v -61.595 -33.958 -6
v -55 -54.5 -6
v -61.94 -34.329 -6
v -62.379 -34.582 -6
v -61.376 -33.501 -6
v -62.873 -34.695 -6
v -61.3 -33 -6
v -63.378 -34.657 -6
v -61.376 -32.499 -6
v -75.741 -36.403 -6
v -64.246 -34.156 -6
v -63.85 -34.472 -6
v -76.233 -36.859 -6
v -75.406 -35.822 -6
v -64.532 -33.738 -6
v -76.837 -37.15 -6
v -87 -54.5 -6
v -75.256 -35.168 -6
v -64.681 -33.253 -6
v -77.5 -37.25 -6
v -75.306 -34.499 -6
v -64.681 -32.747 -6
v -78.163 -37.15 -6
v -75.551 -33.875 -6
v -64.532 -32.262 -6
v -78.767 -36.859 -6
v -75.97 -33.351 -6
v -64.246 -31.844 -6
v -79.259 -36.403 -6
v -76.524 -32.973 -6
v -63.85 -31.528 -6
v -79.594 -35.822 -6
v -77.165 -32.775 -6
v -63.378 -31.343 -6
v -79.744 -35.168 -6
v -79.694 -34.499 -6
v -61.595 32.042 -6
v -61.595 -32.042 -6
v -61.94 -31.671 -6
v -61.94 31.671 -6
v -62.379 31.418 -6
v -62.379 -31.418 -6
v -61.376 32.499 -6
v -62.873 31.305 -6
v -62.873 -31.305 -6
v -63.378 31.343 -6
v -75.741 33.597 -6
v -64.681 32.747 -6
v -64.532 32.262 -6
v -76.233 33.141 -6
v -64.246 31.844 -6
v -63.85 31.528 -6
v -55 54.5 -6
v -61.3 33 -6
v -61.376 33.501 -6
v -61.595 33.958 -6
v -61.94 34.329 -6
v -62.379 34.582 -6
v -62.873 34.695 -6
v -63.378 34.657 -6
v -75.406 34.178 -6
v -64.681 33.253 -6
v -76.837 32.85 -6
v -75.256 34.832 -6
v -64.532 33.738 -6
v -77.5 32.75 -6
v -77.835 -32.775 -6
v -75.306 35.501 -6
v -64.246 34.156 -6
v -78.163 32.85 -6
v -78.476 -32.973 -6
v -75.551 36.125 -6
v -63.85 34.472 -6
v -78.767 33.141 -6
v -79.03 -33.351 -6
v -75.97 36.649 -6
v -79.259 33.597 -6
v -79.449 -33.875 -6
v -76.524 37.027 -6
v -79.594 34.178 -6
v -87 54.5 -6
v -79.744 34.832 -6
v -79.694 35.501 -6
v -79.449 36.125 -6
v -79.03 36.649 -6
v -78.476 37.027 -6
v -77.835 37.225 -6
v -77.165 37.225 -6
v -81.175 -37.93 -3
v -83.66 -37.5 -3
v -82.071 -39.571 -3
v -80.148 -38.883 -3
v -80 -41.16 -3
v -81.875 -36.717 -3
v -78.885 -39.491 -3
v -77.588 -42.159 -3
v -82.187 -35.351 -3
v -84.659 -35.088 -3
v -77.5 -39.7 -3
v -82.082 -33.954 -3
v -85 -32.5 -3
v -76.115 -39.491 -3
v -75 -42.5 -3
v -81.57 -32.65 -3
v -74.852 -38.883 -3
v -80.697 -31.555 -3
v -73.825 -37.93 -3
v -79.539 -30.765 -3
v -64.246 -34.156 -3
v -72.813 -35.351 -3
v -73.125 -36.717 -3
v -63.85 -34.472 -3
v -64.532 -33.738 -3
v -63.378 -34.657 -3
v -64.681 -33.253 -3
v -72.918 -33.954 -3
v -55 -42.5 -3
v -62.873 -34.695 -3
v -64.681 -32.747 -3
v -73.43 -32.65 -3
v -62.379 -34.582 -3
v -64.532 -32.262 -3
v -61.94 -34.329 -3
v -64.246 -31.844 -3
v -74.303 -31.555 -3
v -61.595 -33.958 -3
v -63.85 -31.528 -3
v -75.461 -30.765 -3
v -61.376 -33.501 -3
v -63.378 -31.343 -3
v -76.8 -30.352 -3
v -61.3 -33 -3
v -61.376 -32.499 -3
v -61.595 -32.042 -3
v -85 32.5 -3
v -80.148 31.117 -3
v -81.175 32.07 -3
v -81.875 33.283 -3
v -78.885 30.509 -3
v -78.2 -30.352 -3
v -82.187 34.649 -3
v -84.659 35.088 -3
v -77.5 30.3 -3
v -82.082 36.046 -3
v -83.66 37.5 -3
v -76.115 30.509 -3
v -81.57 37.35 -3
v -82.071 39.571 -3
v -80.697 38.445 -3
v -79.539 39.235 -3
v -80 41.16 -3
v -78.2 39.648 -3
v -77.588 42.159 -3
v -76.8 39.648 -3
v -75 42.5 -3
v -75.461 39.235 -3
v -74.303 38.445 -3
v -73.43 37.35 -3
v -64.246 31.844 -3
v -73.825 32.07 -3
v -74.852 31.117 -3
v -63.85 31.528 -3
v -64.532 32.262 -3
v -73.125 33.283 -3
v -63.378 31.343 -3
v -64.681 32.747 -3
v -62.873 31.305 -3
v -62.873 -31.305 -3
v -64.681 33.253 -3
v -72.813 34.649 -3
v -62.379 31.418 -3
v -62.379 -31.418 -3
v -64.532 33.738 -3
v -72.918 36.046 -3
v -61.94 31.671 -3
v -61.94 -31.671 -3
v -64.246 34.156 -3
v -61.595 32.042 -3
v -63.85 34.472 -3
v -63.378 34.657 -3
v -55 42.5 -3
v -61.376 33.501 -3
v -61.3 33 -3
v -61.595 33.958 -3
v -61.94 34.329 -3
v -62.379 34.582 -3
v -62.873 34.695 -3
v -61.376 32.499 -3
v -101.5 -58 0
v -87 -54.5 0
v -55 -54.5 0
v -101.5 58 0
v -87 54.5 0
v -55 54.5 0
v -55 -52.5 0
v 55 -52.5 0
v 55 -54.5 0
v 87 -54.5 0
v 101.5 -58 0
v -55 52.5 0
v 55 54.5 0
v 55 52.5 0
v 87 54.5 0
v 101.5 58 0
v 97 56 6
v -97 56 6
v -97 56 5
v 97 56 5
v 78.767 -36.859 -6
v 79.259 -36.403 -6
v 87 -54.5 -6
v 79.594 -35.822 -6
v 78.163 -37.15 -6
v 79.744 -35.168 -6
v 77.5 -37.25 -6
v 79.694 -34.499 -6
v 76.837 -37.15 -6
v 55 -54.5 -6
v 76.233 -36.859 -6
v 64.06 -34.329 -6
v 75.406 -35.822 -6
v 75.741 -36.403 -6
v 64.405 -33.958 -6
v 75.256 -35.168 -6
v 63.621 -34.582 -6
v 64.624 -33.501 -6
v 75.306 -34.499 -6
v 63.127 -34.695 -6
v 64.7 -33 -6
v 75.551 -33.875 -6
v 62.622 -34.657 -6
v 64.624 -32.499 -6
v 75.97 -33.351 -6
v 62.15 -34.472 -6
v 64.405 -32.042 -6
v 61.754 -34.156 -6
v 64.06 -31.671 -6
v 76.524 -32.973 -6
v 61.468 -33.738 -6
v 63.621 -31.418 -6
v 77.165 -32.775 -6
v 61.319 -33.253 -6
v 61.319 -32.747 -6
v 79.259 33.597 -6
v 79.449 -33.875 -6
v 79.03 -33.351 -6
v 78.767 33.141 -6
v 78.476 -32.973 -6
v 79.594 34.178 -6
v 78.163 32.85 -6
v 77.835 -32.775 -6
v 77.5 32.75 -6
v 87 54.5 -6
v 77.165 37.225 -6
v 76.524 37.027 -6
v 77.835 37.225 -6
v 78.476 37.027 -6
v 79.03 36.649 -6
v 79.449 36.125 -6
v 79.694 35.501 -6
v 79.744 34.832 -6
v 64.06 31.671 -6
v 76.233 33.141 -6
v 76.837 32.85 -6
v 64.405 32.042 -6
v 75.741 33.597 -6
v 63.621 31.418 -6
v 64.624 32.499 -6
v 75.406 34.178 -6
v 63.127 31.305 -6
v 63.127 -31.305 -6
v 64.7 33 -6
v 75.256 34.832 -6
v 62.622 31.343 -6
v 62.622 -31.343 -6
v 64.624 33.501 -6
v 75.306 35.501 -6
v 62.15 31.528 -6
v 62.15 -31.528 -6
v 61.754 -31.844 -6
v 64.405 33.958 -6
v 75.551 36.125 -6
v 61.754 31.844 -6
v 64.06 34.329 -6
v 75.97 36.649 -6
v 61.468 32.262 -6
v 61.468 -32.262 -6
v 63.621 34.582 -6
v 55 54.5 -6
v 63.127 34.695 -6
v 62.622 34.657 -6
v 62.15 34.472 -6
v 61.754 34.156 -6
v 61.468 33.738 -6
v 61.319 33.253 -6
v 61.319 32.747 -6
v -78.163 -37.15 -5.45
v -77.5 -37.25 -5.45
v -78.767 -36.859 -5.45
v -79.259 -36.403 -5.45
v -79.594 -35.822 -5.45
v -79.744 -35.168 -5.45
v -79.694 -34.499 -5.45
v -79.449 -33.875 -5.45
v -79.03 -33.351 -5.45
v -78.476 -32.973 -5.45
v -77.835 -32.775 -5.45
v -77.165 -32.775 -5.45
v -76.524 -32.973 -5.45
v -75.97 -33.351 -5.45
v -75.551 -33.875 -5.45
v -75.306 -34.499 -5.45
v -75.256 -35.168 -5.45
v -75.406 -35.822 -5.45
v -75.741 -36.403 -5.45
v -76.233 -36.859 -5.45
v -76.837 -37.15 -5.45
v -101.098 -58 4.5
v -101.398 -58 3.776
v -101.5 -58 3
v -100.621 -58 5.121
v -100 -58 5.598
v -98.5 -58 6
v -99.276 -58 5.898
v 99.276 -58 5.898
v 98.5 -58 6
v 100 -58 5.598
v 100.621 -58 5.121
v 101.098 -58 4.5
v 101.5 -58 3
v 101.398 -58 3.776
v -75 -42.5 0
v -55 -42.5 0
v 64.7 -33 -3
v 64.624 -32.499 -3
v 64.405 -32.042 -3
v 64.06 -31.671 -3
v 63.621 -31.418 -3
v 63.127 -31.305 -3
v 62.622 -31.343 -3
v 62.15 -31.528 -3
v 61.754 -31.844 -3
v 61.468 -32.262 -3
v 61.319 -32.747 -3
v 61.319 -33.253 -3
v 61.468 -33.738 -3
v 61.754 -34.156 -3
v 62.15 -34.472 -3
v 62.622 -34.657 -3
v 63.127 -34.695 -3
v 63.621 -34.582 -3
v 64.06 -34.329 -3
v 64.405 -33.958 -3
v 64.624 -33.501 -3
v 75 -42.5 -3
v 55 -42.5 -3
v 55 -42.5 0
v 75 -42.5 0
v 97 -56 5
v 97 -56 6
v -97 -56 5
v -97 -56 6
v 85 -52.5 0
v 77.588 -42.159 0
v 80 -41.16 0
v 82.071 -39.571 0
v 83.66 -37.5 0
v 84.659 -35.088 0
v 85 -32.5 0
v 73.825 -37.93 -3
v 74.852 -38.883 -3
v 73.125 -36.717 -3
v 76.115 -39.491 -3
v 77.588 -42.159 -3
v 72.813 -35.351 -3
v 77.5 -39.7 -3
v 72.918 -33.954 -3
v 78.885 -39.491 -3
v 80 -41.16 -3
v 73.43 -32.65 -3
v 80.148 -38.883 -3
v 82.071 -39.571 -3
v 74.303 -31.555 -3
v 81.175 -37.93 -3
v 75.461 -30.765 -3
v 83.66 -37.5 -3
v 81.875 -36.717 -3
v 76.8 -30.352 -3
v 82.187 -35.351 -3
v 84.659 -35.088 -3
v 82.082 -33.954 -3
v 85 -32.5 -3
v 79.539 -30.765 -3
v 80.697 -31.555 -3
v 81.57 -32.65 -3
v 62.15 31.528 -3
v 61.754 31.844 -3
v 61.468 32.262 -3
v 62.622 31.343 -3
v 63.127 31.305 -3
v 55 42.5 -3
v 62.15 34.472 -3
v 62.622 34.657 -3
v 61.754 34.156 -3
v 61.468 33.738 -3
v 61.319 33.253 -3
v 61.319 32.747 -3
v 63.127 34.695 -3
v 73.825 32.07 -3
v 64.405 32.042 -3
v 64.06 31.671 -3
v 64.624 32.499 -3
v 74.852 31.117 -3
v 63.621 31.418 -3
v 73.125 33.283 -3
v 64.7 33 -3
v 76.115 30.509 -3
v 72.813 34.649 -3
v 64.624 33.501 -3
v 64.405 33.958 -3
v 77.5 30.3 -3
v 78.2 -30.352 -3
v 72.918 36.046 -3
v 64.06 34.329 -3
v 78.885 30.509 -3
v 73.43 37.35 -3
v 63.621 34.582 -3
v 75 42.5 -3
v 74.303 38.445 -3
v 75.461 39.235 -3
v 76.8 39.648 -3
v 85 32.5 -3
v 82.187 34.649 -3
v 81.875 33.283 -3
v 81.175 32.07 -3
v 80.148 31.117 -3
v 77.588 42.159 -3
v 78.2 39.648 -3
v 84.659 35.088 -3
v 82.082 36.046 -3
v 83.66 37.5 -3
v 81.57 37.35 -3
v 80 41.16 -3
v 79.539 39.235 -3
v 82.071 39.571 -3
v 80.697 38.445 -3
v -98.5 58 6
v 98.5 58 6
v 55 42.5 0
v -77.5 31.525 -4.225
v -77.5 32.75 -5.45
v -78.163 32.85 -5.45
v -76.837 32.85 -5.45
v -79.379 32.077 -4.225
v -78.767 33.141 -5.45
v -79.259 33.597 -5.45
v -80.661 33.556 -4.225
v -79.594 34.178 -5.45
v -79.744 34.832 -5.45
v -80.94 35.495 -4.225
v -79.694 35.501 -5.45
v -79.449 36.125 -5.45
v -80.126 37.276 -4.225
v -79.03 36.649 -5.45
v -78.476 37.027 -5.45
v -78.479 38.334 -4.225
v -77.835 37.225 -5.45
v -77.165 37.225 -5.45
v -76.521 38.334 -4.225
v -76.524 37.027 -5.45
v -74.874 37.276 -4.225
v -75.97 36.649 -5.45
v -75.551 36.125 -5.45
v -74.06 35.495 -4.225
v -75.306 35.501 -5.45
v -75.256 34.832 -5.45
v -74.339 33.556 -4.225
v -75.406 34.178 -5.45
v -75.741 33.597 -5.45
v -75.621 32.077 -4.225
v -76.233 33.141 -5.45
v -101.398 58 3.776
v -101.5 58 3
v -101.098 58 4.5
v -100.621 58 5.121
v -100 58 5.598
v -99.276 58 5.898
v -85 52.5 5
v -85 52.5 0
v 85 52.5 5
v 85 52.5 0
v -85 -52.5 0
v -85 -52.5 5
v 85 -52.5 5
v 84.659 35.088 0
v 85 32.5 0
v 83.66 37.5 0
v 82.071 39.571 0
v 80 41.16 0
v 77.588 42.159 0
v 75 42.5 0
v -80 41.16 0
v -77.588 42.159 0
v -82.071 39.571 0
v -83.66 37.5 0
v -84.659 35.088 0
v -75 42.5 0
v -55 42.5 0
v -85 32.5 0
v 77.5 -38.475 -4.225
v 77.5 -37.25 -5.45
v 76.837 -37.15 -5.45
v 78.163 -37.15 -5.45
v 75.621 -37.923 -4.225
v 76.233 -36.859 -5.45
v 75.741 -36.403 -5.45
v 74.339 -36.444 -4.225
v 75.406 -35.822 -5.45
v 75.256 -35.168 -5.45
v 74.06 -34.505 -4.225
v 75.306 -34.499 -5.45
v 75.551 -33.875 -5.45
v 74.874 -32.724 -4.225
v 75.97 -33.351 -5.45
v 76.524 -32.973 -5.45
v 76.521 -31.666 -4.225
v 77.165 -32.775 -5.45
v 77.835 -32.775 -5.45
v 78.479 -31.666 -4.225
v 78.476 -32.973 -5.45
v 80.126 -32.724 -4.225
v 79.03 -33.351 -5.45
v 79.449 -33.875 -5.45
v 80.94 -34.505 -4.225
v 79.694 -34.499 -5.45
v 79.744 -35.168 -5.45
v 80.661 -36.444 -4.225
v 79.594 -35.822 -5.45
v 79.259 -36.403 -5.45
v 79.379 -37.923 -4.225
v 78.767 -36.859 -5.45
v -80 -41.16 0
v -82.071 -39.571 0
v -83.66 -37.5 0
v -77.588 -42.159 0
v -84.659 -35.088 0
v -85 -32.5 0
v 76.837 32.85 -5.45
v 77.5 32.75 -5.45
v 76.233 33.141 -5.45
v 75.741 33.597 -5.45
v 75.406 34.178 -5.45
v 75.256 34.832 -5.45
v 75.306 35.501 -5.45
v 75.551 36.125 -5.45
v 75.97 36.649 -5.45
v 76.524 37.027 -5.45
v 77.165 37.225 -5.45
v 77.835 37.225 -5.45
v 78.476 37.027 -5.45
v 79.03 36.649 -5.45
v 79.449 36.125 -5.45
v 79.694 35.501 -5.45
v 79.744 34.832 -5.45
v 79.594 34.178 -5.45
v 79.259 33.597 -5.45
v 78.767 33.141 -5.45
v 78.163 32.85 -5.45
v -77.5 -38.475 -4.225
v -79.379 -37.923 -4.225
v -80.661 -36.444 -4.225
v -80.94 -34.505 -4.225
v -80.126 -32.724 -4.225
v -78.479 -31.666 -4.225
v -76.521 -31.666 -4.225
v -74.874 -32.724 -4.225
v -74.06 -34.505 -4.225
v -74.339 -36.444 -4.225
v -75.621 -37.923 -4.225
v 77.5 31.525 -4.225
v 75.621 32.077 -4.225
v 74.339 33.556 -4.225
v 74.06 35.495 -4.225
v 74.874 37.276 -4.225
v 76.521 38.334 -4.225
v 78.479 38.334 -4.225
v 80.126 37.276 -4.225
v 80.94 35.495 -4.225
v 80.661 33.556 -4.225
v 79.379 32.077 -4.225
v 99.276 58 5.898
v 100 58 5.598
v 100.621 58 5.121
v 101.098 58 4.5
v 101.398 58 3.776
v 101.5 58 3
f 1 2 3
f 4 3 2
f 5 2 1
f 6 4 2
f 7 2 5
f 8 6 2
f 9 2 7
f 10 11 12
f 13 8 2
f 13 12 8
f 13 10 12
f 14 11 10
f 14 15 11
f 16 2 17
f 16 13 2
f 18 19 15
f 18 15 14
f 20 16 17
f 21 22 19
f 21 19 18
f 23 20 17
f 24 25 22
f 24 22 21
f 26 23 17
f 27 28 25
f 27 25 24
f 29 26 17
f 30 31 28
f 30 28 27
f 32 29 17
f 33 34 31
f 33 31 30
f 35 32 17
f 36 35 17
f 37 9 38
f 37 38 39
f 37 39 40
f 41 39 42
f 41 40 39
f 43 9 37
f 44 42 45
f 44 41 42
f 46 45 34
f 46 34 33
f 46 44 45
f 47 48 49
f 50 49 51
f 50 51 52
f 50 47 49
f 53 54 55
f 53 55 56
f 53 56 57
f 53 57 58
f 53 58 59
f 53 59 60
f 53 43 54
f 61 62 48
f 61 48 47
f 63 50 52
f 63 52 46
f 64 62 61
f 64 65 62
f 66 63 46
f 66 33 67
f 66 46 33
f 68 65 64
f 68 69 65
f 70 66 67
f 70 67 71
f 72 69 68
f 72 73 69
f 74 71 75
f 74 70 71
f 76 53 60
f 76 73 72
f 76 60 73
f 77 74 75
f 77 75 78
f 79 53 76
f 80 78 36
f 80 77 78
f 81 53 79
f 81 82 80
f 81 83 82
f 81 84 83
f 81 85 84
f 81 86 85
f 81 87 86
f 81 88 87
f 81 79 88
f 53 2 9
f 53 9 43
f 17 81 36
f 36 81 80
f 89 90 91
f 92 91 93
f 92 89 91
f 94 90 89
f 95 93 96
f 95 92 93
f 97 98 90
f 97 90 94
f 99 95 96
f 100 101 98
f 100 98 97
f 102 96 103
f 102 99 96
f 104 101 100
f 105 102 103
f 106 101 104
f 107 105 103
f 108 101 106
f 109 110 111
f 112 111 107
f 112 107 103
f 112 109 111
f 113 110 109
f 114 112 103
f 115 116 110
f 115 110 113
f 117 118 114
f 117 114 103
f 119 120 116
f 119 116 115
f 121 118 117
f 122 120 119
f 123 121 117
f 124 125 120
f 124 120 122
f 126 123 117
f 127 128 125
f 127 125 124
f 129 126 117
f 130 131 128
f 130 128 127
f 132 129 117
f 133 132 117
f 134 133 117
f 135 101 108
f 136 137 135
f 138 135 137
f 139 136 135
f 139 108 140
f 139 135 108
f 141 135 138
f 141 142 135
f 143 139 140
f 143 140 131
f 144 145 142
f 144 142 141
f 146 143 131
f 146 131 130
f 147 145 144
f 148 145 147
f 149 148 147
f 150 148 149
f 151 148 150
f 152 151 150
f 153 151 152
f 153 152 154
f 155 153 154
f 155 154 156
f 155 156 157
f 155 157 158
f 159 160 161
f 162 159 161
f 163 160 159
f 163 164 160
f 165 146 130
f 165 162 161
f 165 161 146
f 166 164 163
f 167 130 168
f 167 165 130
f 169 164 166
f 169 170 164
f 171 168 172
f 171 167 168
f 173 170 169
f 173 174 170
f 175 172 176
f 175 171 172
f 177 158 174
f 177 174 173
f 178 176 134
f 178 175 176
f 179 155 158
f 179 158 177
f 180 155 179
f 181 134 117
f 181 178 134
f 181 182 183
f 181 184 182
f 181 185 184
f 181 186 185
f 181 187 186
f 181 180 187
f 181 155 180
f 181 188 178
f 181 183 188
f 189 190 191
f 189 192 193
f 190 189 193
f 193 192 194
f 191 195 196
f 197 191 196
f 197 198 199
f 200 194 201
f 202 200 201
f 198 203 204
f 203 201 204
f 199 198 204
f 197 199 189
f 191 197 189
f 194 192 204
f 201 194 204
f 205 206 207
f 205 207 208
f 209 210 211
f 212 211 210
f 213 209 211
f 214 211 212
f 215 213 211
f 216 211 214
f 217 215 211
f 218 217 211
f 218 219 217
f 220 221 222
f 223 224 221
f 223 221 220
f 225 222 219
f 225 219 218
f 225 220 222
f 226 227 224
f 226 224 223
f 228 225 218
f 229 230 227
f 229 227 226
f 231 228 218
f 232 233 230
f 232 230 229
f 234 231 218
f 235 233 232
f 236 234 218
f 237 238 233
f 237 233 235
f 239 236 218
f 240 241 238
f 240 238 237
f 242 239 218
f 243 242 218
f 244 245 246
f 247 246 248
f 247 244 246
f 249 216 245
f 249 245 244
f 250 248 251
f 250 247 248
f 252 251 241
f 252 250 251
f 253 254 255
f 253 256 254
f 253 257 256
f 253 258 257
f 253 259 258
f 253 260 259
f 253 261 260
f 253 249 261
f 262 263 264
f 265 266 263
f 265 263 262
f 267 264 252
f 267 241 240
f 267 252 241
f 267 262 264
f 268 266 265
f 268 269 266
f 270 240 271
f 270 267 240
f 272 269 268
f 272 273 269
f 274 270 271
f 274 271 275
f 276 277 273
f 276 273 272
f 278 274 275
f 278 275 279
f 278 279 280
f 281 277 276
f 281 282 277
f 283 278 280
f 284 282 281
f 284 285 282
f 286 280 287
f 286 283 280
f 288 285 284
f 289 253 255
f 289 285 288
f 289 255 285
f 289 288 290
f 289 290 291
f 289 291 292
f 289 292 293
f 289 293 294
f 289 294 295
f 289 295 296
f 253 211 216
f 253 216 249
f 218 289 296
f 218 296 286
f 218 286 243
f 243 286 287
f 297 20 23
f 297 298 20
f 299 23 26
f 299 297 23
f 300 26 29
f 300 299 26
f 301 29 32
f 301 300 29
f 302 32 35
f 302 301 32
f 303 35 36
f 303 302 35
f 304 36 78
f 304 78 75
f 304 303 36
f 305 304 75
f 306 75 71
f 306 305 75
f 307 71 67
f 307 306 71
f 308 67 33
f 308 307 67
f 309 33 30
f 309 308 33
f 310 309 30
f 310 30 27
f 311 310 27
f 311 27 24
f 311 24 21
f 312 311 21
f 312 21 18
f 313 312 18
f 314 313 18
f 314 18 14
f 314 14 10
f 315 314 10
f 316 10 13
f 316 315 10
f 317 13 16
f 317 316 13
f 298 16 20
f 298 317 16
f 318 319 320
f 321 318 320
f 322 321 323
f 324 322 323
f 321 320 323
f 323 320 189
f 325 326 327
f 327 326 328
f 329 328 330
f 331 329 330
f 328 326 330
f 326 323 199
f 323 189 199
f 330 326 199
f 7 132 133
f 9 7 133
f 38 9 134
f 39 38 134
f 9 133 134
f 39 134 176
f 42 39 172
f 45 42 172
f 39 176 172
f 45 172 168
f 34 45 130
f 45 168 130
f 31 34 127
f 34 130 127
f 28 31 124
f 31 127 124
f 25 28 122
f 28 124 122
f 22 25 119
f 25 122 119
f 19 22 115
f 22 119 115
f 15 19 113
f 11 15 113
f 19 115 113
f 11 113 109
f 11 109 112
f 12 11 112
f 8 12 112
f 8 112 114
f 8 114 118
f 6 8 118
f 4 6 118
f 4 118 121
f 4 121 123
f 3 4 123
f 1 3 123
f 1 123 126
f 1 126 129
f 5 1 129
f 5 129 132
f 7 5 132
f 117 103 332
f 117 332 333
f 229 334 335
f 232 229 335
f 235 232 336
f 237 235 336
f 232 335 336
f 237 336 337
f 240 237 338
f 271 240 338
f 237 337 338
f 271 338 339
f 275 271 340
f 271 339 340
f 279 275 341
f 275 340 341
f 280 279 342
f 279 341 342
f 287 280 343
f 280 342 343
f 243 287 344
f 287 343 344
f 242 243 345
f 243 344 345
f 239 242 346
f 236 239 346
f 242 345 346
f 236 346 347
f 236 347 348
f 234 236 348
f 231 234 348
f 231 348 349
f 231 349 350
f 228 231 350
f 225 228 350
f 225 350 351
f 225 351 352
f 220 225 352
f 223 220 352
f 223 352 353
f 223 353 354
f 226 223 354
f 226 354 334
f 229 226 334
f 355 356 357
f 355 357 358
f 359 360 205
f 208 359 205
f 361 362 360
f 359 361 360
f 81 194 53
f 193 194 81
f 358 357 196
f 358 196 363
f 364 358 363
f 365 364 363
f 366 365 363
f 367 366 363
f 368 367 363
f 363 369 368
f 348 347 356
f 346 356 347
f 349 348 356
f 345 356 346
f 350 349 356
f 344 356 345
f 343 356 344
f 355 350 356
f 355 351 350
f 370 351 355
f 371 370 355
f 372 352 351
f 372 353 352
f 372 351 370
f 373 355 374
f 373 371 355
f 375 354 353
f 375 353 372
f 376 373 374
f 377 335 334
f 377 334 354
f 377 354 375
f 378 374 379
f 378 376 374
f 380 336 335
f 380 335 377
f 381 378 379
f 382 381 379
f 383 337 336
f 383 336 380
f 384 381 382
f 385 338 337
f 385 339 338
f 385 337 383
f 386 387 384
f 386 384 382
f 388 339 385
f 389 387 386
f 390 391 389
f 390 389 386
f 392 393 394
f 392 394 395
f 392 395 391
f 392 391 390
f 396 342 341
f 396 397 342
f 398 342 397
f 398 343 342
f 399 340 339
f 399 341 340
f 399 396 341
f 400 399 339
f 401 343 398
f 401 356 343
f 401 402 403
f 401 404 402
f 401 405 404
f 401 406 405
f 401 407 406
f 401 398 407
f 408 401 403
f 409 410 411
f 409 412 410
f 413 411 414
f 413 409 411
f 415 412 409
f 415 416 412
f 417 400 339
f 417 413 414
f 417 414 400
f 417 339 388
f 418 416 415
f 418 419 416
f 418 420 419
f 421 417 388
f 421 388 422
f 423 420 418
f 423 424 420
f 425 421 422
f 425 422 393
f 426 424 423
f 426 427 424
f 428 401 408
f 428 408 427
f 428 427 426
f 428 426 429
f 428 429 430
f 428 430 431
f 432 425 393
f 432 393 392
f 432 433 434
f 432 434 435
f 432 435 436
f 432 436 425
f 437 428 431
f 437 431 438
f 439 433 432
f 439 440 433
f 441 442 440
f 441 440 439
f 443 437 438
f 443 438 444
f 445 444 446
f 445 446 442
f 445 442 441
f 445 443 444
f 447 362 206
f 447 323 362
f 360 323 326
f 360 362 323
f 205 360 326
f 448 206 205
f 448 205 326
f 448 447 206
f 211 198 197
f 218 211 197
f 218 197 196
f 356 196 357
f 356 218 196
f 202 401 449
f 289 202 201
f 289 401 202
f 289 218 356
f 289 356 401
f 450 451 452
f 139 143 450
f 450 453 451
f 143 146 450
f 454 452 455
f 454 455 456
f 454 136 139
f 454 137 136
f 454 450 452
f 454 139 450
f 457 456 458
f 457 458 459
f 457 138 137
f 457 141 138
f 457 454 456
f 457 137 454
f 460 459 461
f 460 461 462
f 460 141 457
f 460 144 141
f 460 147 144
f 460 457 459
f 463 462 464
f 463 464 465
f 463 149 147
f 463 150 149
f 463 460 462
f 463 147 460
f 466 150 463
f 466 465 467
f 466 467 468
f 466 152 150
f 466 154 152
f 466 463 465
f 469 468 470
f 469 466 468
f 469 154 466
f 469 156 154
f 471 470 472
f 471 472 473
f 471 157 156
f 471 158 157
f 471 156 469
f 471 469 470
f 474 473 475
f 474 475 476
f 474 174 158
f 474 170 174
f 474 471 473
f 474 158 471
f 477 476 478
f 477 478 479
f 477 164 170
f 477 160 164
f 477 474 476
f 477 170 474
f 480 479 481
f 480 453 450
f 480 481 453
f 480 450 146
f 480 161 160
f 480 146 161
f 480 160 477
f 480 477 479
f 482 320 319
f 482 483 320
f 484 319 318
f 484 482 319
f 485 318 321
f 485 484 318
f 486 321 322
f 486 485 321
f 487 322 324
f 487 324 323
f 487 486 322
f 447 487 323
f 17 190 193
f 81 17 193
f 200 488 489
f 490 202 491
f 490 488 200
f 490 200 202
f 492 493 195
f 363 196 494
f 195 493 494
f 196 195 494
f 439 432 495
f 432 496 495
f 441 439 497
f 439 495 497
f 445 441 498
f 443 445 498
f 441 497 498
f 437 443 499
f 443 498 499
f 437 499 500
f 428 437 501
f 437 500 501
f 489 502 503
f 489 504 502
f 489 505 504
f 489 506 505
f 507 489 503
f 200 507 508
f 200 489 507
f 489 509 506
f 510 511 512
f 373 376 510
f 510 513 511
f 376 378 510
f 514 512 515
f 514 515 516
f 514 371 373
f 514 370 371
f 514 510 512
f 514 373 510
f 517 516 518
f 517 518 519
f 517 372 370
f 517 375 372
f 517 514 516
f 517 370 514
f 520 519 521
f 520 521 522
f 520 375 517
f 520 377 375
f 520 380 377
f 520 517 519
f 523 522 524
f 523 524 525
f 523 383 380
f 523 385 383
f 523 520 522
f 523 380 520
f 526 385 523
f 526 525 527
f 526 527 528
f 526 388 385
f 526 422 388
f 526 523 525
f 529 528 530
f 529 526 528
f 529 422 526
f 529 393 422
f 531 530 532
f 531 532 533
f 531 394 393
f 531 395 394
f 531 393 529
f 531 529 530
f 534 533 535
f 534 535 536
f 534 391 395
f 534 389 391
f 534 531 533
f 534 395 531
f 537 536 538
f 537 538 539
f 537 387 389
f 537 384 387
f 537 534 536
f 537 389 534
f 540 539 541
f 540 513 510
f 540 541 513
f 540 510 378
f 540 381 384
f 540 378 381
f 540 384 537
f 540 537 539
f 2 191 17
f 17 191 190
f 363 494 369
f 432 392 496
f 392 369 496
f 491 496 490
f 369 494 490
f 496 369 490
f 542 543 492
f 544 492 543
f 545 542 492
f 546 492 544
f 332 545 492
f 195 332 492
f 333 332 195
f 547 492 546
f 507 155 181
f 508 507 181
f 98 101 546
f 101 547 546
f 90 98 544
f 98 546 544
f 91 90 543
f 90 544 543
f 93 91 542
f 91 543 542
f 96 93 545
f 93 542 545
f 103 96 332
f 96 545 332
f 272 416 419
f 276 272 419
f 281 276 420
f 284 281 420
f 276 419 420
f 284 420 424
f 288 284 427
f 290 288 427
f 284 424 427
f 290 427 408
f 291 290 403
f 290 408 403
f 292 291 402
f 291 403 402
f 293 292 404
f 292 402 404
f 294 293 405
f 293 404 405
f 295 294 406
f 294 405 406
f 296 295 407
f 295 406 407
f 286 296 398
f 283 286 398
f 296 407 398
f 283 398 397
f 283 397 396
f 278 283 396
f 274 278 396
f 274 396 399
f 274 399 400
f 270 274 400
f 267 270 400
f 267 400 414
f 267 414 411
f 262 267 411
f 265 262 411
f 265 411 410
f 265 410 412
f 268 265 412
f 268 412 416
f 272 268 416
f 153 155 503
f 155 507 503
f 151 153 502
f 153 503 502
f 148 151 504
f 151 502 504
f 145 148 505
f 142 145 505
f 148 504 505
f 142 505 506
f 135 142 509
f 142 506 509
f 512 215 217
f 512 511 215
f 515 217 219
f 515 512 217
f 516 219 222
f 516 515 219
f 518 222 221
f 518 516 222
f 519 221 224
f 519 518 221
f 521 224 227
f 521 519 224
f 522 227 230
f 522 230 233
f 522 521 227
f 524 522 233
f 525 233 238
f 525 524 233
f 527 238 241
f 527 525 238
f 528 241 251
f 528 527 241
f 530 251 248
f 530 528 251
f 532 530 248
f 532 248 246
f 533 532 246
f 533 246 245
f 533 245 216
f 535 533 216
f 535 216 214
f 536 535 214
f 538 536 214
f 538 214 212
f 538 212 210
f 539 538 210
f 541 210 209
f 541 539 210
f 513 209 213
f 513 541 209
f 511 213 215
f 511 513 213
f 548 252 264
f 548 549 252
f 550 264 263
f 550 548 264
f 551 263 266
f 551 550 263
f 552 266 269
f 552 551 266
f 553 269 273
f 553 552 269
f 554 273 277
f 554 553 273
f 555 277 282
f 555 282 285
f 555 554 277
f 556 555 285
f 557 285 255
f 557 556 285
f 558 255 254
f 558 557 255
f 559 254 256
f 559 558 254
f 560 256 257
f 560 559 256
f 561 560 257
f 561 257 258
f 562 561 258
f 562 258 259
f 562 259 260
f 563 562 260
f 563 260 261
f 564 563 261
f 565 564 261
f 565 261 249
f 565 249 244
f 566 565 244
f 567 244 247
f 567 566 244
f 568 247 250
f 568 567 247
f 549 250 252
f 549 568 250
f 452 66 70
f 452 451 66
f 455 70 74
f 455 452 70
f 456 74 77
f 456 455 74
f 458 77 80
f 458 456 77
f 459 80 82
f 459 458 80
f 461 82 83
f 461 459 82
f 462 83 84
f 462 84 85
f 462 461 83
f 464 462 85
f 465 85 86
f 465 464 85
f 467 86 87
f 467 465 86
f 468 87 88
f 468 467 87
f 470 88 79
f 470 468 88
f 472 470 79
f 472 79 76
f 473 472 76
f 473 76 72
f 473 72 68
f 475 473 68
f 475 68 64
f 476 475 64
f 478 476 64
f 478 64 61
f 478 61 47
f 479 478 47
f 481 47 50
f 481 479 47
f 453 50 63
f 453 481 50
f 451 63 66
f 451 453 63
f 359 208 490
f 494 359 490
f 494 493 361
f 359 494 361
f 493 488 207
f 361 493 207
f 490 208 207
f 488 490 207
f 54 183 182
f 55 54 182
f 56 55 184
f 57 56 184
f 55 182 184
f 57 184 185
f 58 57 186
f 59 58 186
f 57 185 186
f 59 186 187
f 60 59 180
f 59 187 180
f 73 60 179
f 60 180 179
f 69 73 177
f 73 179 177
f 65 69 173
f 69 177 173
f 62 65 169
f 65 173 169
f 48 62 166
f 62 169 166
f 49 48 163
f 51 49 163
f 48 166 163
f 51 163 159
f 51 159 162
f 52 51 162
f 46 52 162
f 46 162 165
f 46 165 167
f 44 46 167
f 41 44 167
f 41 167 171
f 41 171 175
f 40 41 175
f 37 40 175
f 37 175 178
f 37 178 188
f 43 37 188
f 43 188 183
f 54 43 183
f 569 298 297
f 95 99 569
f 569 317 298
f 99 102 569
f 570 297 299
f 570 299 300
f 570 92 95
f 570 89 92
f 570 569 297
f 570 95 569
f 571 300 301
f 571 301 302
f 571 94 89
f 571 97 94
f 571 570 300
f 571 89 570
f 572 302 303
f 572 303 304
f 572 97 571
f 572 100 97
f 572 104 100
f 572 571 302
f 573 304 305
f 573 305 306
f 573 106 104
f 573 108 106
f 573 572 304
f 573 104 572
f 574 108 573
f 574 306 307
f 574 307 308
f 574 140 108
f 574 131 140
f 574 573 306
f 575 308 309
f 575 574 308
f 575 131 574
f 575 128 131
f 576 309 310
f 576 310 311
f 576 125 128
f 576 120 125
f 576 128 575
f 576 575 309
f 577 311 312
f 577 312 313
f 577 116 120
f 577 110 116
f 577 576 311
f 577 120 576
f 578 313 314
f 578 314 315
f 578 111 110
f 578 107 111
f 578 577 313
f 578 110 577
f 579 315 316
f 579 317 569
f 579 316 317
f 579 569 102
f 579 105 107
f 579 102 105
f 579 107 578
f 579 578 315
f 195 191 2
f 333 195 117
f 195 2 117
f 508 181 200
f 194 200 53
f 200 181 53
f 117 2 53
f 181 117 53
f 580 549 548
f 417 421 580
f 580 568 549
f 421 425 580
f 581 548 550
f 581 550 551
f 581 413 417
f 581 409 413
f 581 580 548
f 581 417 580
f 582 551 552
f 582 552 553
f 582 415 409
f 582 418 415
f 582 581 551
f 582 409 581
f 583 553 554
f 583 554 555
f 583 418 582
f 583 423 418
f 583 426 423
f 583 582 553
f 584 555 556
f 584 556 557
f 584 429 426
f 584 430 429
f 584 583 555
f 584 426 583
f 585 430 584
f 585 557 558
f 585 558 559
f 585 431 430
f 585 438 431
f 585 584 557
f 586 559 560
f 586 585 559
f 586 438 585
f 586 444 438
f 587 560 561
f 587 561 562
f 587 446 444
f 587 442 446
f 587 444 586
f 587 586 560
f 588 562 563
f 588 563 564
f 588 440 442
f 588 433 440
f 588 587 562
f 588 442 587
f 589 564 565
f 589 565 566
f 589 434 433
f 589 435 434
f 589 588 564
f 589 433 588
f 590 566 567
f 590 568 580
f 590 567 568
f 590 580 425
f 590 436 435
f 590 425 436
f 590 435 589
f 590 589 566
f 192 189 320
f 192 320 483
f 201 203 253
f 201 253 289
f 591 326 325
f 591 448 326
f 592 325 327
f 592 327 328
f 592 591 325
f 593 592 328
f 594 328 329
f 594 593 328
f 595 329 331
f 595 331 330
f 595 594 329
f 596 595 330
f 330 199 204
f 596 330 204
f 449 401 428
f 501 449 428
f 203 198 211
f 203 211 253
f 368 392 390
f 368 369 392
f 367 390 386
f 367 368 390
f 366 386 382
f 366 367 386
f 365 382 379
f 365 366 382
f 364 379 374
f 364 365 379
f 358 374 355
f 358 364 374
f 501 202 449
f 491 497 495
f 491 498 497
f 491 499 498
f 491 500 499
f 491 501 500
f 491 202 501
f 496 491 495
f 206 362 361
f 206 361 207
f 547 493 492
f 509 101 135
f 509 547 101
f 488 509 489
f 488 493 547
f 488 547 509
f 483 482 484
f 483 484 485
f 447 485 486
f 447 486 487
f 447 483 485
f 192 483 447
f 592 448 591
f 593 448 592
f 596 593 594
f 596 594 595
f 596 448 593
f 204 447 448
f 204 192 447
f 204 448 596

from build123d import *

# Parameters (mm, degrees)
ESBO_O1_W                                    = 203
ESBO_O1_H                                    = 116
RESSALTO_EXTRUS_O1_DEPTH                     = 6
ESBO_O2_W                                    = 194
ESBO_O2_H                                    = 112
CORTE_EXTRUS_O1_DEPTH                        = 1
FILETE2_R                                    = 3
ESBO_O3_W                                    = 174
ESBO_O3_H                                    = 109
RESSALTO_EXTRUS_O2_DEPTH                     = 11
ESBO_O4_W                                    = 110
ESBO_O4_H                                    = 109
CORTE_EXTRUS_O2_DEPTH                        = 6
ESBO_O5_W                                    = 170
ESBO_O5_H                                    = 105
CORTE_EXTRUS_O3_DEPTH                        = 8
FURO_COM_FOLGA_DE_M31_D                      = 3.4
ESCAREADO_PARA_PARAFUSO_COM_CABE_A_E_2_COUNT = 2
ESCAREADO_PARA_PARAFUSO_COM_CABE_A_E_2_PITCH = 155
ESCAREADO_PARA_PARAFUSO_COM_CABE_A_E_3_COUNT = 2
ESCAREADO_PARA_PARAFUSO_COM_CABE_A_E_3_PITCH = 70
ESCAREADO_PARA_PARAFUSO_COM_CABE_A_E_4_COUNT = 2
ESCAREADO_PARA_PARAFUSO_COM_CABE_A_E_4_PITCH = 170.073513517
ESBO_O10_W                                   = 30
ESBO_O10_H                                   = 10
RESSALTO_EXTRUS_O3_DEPTH                     = 3
FILETE3_R                                    = 10


with BuildPart() as part:
    # Esboço1 → Ressalto-extrusão1 (new body)
    with BuildSketch(Plane.XY):
        Rectangle(ESBO_O1_W, ESBO_O1_H)
    extrude(amount=RESSALTO_EXTRUS_O1_DEPTH)

    # Esboço2 → Corte-extrusão1 (cut)
    with BuildSketch(Plane.XY.offset(6)):
        Rectangle(ESBO_O2_W, ESBO_O2_H)
    extrude(amount=-CORTE_EXTRUS_O1_DEPTH, mode=Mode.SUBTRACT)

    # Filete2
    filete2_edges = [part.edges().sort_by_distance(p)[0] for p in [
        (-101.5, 0, 6),
        (101.5, 0, 6),
    ]]
    fillet(filete2_edges, radius=FILETE2_R)

    # Esboço3 → Ressalto-extrusão2 (add)
    with BuildSketch(Plane(origin=(0, 0, 5), x_dir=(-1, 0, 0), z_dir=(0, 0, -1))):
        Rectangle(ESBO_O3_W, ESBO_O3_H)
    extrude(amount=RESSALTO_EXTRUS_O2_DEPTH)

    # Esboço4 → Corte-extrusão2 (cut)
    with BuildSketch(Plane(origin=(0, 0, -6), x_dir=(-1, 0, 0), z_dir=(0, 0, -1))):
        Rectangle(ESBO_O4_W, ESBO_O4_H)
    extrude(amount=-CORTE_EXTRUS_O2_DEPTH, mode=Mode.SUBTRACT)

    # Esboço5 → Corte-extrusão3 (cut)
    with BuildSketch(Plane.XY.offset(5)):
        Rectangle(ESBO_O5_W, ESBO_O5_H)
    extrude(amount=-CORTE_EXTRUS_O3_DEPTH, mode=Mode.SUBTRACT)

    # Furo com folga de M31 (through all)
    with Locations(Plane(origin=(0, 0, -6), x_dir=(-1, 0, 0), z_dir=(0, 0, -1))):
        with Locations((-63, 33), (63, 33), (63, -33), (-63, -33)):
            Hole(FURO_COM_FOLGA_DE_M31_D / 2)

    # Esboço9 → Escareado para parafuso com cabeça escareada chata de M41 (revolve, cut)
    with BuildSketch(Plane(origin=(77.5, 35, -3), x_dir=(0, -1, 0), z_dir=(1, 0, 0))):
        Polygon((0, 0), (0, 3), (2.25, 3), (2.25, 2.45), (4.7, 0), align=None)
    escareado_para_parafuso_com_cabe_a_escar = revolve(axis=Axis((77.5, 35, 3.35), (0, 0, -1)), mode=Mode.SUBTRACT)

    # Escareado para parafuso com cabe_a e 2: Escareado para parafuso com cabeça escareada chata de M41 ×2
    with Locations(*[(-i * ESCAREADO_PARA_PARAFUSO_COM_CABE_A_E_2_PITCH, 0, 0) for i in range(1, ESCAREADO_PARA_PARAFUSO_COM_CABE_A_E_2_COUNT)]):
        add(escareado_para_parafuso_com_cabe_a_escar, mode=Mode.SUBTRACT)

    # Escareado para parafuso com cabe_a e 3: Escareado para parafuso com cabeça escareada chata de M41 ×2
    with Locations(*[(0, -i * ESCAREADO_PARA_PARAFUSO_COM_CABE_A_E_3_PITCH, 0) for i in range(1, ESCAREADO_PARA_PARAFUSO_COM_CABE_A_E_3_COUNT)]):
        add(escareado_para_parafuso_com_cabe_a_escar, mode=Mode.SUBTRACT)

    # Escareado para parafuso com cabe_a e 4: Escareado para parafuso com cabeça escareada chata de M41 ×2
    with Locations(*[Vector(-0.911370599658675, -0.41158672242649835, 0) * (i * ESCAREADO_PARA_PARAFUSO_COM_CABE_A_E_4_PITCH) for i in range(1, ESCAREADO_PARA_PARAFUSO_COM_CABE_A_E_4_COUNT)]):
        add(escareado_para_parafuso_com_cabe_a_escar, mode=Mode.SUBTRACT)

    # Esboço10 → Ressalto-extrusão3 (add)
    with BuildSketch(Plane.XY.offset(-3)):
        with Locations((-70, 47.5)):
            Rectangle(ESBO_O10_W, ESBO_O10_H)
        with Locations((70, 47.5)):
            Rectangle(ESBO_O10_W, ESBO_O10_H)
        with Locations((70, -47.5)):
            Rectangle(ESBO_O10_W, ESBO_O10_H)
        with Locations((-70, -47.5)):
            Rectangle(ESBO_O10_W, ESBO_O10_H)
    extrude(amount=RESSALTO_EXTRUS_O3_DEPTH)

    # Filete3
    filete3_edges = [part.edges().sort_by_distance(p)[0] for p in [
        (-85, 42.5, -1.5),
        (85, 42.5, -1.5),
        (85, -42.5, -1.5),
        (-85, -42.5, -1.5),
    ]]
    fillet(filete3_edges, radius=FILETE3_R)


solid = part.part
